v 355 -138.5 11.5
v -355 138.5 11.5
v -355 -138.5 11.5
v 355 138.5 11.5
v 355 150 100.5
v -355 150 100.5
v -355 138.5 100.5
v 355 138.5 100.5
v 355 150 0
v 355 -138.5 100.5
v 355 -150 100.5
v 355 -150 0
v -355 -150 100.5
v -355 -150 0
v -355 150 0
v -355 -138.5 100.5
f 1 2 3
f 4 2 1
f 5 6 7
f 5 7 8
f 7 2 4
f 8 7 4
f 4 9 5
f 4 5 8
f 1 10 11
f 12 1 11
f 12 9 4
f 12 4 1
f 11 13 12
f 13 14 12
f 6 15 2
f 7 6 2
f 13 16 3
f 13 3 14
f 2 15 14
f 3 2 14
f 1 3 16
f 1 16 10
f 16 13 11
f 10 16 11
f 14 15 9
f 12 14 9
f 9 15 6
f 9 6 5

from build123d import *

# Parameters (mm, degrees)
SKETCH_1_W      = 710
SKETCH_1_H      = 300
EXTRUDE_1_DEPTH = 11.5
SKETCH_3_W      = 710
SKETCH_3_H      = 11.5
EXTRUDE_2_DEPTH = 89


with BuildPart() as part:
    # 草图1 → 凸台-拉伸1 (new body)
    with BuildSketch(Plane.XY):
        Rectangle(SKETCH_1_W, SKETCH_1_H)
    extrude(amount=EXTRUDE_1_DEPTH)

    # 草图3 → 凸台-拉伸2 (add)
    with BuildSketch(Plane.XY.offset(11.5)):
        with Locations((0, 144.25)):
            Rectangle(SKETCH_3_W, SKETCH_3_H)
    extrude_2 = extrude(amount=EXTRUDE_2_DEPTH)

    # 镜向1: 凸台-拉伸2 across plane
    add(extrude_2.mirror(Plane.ZX))


solid = part.part
